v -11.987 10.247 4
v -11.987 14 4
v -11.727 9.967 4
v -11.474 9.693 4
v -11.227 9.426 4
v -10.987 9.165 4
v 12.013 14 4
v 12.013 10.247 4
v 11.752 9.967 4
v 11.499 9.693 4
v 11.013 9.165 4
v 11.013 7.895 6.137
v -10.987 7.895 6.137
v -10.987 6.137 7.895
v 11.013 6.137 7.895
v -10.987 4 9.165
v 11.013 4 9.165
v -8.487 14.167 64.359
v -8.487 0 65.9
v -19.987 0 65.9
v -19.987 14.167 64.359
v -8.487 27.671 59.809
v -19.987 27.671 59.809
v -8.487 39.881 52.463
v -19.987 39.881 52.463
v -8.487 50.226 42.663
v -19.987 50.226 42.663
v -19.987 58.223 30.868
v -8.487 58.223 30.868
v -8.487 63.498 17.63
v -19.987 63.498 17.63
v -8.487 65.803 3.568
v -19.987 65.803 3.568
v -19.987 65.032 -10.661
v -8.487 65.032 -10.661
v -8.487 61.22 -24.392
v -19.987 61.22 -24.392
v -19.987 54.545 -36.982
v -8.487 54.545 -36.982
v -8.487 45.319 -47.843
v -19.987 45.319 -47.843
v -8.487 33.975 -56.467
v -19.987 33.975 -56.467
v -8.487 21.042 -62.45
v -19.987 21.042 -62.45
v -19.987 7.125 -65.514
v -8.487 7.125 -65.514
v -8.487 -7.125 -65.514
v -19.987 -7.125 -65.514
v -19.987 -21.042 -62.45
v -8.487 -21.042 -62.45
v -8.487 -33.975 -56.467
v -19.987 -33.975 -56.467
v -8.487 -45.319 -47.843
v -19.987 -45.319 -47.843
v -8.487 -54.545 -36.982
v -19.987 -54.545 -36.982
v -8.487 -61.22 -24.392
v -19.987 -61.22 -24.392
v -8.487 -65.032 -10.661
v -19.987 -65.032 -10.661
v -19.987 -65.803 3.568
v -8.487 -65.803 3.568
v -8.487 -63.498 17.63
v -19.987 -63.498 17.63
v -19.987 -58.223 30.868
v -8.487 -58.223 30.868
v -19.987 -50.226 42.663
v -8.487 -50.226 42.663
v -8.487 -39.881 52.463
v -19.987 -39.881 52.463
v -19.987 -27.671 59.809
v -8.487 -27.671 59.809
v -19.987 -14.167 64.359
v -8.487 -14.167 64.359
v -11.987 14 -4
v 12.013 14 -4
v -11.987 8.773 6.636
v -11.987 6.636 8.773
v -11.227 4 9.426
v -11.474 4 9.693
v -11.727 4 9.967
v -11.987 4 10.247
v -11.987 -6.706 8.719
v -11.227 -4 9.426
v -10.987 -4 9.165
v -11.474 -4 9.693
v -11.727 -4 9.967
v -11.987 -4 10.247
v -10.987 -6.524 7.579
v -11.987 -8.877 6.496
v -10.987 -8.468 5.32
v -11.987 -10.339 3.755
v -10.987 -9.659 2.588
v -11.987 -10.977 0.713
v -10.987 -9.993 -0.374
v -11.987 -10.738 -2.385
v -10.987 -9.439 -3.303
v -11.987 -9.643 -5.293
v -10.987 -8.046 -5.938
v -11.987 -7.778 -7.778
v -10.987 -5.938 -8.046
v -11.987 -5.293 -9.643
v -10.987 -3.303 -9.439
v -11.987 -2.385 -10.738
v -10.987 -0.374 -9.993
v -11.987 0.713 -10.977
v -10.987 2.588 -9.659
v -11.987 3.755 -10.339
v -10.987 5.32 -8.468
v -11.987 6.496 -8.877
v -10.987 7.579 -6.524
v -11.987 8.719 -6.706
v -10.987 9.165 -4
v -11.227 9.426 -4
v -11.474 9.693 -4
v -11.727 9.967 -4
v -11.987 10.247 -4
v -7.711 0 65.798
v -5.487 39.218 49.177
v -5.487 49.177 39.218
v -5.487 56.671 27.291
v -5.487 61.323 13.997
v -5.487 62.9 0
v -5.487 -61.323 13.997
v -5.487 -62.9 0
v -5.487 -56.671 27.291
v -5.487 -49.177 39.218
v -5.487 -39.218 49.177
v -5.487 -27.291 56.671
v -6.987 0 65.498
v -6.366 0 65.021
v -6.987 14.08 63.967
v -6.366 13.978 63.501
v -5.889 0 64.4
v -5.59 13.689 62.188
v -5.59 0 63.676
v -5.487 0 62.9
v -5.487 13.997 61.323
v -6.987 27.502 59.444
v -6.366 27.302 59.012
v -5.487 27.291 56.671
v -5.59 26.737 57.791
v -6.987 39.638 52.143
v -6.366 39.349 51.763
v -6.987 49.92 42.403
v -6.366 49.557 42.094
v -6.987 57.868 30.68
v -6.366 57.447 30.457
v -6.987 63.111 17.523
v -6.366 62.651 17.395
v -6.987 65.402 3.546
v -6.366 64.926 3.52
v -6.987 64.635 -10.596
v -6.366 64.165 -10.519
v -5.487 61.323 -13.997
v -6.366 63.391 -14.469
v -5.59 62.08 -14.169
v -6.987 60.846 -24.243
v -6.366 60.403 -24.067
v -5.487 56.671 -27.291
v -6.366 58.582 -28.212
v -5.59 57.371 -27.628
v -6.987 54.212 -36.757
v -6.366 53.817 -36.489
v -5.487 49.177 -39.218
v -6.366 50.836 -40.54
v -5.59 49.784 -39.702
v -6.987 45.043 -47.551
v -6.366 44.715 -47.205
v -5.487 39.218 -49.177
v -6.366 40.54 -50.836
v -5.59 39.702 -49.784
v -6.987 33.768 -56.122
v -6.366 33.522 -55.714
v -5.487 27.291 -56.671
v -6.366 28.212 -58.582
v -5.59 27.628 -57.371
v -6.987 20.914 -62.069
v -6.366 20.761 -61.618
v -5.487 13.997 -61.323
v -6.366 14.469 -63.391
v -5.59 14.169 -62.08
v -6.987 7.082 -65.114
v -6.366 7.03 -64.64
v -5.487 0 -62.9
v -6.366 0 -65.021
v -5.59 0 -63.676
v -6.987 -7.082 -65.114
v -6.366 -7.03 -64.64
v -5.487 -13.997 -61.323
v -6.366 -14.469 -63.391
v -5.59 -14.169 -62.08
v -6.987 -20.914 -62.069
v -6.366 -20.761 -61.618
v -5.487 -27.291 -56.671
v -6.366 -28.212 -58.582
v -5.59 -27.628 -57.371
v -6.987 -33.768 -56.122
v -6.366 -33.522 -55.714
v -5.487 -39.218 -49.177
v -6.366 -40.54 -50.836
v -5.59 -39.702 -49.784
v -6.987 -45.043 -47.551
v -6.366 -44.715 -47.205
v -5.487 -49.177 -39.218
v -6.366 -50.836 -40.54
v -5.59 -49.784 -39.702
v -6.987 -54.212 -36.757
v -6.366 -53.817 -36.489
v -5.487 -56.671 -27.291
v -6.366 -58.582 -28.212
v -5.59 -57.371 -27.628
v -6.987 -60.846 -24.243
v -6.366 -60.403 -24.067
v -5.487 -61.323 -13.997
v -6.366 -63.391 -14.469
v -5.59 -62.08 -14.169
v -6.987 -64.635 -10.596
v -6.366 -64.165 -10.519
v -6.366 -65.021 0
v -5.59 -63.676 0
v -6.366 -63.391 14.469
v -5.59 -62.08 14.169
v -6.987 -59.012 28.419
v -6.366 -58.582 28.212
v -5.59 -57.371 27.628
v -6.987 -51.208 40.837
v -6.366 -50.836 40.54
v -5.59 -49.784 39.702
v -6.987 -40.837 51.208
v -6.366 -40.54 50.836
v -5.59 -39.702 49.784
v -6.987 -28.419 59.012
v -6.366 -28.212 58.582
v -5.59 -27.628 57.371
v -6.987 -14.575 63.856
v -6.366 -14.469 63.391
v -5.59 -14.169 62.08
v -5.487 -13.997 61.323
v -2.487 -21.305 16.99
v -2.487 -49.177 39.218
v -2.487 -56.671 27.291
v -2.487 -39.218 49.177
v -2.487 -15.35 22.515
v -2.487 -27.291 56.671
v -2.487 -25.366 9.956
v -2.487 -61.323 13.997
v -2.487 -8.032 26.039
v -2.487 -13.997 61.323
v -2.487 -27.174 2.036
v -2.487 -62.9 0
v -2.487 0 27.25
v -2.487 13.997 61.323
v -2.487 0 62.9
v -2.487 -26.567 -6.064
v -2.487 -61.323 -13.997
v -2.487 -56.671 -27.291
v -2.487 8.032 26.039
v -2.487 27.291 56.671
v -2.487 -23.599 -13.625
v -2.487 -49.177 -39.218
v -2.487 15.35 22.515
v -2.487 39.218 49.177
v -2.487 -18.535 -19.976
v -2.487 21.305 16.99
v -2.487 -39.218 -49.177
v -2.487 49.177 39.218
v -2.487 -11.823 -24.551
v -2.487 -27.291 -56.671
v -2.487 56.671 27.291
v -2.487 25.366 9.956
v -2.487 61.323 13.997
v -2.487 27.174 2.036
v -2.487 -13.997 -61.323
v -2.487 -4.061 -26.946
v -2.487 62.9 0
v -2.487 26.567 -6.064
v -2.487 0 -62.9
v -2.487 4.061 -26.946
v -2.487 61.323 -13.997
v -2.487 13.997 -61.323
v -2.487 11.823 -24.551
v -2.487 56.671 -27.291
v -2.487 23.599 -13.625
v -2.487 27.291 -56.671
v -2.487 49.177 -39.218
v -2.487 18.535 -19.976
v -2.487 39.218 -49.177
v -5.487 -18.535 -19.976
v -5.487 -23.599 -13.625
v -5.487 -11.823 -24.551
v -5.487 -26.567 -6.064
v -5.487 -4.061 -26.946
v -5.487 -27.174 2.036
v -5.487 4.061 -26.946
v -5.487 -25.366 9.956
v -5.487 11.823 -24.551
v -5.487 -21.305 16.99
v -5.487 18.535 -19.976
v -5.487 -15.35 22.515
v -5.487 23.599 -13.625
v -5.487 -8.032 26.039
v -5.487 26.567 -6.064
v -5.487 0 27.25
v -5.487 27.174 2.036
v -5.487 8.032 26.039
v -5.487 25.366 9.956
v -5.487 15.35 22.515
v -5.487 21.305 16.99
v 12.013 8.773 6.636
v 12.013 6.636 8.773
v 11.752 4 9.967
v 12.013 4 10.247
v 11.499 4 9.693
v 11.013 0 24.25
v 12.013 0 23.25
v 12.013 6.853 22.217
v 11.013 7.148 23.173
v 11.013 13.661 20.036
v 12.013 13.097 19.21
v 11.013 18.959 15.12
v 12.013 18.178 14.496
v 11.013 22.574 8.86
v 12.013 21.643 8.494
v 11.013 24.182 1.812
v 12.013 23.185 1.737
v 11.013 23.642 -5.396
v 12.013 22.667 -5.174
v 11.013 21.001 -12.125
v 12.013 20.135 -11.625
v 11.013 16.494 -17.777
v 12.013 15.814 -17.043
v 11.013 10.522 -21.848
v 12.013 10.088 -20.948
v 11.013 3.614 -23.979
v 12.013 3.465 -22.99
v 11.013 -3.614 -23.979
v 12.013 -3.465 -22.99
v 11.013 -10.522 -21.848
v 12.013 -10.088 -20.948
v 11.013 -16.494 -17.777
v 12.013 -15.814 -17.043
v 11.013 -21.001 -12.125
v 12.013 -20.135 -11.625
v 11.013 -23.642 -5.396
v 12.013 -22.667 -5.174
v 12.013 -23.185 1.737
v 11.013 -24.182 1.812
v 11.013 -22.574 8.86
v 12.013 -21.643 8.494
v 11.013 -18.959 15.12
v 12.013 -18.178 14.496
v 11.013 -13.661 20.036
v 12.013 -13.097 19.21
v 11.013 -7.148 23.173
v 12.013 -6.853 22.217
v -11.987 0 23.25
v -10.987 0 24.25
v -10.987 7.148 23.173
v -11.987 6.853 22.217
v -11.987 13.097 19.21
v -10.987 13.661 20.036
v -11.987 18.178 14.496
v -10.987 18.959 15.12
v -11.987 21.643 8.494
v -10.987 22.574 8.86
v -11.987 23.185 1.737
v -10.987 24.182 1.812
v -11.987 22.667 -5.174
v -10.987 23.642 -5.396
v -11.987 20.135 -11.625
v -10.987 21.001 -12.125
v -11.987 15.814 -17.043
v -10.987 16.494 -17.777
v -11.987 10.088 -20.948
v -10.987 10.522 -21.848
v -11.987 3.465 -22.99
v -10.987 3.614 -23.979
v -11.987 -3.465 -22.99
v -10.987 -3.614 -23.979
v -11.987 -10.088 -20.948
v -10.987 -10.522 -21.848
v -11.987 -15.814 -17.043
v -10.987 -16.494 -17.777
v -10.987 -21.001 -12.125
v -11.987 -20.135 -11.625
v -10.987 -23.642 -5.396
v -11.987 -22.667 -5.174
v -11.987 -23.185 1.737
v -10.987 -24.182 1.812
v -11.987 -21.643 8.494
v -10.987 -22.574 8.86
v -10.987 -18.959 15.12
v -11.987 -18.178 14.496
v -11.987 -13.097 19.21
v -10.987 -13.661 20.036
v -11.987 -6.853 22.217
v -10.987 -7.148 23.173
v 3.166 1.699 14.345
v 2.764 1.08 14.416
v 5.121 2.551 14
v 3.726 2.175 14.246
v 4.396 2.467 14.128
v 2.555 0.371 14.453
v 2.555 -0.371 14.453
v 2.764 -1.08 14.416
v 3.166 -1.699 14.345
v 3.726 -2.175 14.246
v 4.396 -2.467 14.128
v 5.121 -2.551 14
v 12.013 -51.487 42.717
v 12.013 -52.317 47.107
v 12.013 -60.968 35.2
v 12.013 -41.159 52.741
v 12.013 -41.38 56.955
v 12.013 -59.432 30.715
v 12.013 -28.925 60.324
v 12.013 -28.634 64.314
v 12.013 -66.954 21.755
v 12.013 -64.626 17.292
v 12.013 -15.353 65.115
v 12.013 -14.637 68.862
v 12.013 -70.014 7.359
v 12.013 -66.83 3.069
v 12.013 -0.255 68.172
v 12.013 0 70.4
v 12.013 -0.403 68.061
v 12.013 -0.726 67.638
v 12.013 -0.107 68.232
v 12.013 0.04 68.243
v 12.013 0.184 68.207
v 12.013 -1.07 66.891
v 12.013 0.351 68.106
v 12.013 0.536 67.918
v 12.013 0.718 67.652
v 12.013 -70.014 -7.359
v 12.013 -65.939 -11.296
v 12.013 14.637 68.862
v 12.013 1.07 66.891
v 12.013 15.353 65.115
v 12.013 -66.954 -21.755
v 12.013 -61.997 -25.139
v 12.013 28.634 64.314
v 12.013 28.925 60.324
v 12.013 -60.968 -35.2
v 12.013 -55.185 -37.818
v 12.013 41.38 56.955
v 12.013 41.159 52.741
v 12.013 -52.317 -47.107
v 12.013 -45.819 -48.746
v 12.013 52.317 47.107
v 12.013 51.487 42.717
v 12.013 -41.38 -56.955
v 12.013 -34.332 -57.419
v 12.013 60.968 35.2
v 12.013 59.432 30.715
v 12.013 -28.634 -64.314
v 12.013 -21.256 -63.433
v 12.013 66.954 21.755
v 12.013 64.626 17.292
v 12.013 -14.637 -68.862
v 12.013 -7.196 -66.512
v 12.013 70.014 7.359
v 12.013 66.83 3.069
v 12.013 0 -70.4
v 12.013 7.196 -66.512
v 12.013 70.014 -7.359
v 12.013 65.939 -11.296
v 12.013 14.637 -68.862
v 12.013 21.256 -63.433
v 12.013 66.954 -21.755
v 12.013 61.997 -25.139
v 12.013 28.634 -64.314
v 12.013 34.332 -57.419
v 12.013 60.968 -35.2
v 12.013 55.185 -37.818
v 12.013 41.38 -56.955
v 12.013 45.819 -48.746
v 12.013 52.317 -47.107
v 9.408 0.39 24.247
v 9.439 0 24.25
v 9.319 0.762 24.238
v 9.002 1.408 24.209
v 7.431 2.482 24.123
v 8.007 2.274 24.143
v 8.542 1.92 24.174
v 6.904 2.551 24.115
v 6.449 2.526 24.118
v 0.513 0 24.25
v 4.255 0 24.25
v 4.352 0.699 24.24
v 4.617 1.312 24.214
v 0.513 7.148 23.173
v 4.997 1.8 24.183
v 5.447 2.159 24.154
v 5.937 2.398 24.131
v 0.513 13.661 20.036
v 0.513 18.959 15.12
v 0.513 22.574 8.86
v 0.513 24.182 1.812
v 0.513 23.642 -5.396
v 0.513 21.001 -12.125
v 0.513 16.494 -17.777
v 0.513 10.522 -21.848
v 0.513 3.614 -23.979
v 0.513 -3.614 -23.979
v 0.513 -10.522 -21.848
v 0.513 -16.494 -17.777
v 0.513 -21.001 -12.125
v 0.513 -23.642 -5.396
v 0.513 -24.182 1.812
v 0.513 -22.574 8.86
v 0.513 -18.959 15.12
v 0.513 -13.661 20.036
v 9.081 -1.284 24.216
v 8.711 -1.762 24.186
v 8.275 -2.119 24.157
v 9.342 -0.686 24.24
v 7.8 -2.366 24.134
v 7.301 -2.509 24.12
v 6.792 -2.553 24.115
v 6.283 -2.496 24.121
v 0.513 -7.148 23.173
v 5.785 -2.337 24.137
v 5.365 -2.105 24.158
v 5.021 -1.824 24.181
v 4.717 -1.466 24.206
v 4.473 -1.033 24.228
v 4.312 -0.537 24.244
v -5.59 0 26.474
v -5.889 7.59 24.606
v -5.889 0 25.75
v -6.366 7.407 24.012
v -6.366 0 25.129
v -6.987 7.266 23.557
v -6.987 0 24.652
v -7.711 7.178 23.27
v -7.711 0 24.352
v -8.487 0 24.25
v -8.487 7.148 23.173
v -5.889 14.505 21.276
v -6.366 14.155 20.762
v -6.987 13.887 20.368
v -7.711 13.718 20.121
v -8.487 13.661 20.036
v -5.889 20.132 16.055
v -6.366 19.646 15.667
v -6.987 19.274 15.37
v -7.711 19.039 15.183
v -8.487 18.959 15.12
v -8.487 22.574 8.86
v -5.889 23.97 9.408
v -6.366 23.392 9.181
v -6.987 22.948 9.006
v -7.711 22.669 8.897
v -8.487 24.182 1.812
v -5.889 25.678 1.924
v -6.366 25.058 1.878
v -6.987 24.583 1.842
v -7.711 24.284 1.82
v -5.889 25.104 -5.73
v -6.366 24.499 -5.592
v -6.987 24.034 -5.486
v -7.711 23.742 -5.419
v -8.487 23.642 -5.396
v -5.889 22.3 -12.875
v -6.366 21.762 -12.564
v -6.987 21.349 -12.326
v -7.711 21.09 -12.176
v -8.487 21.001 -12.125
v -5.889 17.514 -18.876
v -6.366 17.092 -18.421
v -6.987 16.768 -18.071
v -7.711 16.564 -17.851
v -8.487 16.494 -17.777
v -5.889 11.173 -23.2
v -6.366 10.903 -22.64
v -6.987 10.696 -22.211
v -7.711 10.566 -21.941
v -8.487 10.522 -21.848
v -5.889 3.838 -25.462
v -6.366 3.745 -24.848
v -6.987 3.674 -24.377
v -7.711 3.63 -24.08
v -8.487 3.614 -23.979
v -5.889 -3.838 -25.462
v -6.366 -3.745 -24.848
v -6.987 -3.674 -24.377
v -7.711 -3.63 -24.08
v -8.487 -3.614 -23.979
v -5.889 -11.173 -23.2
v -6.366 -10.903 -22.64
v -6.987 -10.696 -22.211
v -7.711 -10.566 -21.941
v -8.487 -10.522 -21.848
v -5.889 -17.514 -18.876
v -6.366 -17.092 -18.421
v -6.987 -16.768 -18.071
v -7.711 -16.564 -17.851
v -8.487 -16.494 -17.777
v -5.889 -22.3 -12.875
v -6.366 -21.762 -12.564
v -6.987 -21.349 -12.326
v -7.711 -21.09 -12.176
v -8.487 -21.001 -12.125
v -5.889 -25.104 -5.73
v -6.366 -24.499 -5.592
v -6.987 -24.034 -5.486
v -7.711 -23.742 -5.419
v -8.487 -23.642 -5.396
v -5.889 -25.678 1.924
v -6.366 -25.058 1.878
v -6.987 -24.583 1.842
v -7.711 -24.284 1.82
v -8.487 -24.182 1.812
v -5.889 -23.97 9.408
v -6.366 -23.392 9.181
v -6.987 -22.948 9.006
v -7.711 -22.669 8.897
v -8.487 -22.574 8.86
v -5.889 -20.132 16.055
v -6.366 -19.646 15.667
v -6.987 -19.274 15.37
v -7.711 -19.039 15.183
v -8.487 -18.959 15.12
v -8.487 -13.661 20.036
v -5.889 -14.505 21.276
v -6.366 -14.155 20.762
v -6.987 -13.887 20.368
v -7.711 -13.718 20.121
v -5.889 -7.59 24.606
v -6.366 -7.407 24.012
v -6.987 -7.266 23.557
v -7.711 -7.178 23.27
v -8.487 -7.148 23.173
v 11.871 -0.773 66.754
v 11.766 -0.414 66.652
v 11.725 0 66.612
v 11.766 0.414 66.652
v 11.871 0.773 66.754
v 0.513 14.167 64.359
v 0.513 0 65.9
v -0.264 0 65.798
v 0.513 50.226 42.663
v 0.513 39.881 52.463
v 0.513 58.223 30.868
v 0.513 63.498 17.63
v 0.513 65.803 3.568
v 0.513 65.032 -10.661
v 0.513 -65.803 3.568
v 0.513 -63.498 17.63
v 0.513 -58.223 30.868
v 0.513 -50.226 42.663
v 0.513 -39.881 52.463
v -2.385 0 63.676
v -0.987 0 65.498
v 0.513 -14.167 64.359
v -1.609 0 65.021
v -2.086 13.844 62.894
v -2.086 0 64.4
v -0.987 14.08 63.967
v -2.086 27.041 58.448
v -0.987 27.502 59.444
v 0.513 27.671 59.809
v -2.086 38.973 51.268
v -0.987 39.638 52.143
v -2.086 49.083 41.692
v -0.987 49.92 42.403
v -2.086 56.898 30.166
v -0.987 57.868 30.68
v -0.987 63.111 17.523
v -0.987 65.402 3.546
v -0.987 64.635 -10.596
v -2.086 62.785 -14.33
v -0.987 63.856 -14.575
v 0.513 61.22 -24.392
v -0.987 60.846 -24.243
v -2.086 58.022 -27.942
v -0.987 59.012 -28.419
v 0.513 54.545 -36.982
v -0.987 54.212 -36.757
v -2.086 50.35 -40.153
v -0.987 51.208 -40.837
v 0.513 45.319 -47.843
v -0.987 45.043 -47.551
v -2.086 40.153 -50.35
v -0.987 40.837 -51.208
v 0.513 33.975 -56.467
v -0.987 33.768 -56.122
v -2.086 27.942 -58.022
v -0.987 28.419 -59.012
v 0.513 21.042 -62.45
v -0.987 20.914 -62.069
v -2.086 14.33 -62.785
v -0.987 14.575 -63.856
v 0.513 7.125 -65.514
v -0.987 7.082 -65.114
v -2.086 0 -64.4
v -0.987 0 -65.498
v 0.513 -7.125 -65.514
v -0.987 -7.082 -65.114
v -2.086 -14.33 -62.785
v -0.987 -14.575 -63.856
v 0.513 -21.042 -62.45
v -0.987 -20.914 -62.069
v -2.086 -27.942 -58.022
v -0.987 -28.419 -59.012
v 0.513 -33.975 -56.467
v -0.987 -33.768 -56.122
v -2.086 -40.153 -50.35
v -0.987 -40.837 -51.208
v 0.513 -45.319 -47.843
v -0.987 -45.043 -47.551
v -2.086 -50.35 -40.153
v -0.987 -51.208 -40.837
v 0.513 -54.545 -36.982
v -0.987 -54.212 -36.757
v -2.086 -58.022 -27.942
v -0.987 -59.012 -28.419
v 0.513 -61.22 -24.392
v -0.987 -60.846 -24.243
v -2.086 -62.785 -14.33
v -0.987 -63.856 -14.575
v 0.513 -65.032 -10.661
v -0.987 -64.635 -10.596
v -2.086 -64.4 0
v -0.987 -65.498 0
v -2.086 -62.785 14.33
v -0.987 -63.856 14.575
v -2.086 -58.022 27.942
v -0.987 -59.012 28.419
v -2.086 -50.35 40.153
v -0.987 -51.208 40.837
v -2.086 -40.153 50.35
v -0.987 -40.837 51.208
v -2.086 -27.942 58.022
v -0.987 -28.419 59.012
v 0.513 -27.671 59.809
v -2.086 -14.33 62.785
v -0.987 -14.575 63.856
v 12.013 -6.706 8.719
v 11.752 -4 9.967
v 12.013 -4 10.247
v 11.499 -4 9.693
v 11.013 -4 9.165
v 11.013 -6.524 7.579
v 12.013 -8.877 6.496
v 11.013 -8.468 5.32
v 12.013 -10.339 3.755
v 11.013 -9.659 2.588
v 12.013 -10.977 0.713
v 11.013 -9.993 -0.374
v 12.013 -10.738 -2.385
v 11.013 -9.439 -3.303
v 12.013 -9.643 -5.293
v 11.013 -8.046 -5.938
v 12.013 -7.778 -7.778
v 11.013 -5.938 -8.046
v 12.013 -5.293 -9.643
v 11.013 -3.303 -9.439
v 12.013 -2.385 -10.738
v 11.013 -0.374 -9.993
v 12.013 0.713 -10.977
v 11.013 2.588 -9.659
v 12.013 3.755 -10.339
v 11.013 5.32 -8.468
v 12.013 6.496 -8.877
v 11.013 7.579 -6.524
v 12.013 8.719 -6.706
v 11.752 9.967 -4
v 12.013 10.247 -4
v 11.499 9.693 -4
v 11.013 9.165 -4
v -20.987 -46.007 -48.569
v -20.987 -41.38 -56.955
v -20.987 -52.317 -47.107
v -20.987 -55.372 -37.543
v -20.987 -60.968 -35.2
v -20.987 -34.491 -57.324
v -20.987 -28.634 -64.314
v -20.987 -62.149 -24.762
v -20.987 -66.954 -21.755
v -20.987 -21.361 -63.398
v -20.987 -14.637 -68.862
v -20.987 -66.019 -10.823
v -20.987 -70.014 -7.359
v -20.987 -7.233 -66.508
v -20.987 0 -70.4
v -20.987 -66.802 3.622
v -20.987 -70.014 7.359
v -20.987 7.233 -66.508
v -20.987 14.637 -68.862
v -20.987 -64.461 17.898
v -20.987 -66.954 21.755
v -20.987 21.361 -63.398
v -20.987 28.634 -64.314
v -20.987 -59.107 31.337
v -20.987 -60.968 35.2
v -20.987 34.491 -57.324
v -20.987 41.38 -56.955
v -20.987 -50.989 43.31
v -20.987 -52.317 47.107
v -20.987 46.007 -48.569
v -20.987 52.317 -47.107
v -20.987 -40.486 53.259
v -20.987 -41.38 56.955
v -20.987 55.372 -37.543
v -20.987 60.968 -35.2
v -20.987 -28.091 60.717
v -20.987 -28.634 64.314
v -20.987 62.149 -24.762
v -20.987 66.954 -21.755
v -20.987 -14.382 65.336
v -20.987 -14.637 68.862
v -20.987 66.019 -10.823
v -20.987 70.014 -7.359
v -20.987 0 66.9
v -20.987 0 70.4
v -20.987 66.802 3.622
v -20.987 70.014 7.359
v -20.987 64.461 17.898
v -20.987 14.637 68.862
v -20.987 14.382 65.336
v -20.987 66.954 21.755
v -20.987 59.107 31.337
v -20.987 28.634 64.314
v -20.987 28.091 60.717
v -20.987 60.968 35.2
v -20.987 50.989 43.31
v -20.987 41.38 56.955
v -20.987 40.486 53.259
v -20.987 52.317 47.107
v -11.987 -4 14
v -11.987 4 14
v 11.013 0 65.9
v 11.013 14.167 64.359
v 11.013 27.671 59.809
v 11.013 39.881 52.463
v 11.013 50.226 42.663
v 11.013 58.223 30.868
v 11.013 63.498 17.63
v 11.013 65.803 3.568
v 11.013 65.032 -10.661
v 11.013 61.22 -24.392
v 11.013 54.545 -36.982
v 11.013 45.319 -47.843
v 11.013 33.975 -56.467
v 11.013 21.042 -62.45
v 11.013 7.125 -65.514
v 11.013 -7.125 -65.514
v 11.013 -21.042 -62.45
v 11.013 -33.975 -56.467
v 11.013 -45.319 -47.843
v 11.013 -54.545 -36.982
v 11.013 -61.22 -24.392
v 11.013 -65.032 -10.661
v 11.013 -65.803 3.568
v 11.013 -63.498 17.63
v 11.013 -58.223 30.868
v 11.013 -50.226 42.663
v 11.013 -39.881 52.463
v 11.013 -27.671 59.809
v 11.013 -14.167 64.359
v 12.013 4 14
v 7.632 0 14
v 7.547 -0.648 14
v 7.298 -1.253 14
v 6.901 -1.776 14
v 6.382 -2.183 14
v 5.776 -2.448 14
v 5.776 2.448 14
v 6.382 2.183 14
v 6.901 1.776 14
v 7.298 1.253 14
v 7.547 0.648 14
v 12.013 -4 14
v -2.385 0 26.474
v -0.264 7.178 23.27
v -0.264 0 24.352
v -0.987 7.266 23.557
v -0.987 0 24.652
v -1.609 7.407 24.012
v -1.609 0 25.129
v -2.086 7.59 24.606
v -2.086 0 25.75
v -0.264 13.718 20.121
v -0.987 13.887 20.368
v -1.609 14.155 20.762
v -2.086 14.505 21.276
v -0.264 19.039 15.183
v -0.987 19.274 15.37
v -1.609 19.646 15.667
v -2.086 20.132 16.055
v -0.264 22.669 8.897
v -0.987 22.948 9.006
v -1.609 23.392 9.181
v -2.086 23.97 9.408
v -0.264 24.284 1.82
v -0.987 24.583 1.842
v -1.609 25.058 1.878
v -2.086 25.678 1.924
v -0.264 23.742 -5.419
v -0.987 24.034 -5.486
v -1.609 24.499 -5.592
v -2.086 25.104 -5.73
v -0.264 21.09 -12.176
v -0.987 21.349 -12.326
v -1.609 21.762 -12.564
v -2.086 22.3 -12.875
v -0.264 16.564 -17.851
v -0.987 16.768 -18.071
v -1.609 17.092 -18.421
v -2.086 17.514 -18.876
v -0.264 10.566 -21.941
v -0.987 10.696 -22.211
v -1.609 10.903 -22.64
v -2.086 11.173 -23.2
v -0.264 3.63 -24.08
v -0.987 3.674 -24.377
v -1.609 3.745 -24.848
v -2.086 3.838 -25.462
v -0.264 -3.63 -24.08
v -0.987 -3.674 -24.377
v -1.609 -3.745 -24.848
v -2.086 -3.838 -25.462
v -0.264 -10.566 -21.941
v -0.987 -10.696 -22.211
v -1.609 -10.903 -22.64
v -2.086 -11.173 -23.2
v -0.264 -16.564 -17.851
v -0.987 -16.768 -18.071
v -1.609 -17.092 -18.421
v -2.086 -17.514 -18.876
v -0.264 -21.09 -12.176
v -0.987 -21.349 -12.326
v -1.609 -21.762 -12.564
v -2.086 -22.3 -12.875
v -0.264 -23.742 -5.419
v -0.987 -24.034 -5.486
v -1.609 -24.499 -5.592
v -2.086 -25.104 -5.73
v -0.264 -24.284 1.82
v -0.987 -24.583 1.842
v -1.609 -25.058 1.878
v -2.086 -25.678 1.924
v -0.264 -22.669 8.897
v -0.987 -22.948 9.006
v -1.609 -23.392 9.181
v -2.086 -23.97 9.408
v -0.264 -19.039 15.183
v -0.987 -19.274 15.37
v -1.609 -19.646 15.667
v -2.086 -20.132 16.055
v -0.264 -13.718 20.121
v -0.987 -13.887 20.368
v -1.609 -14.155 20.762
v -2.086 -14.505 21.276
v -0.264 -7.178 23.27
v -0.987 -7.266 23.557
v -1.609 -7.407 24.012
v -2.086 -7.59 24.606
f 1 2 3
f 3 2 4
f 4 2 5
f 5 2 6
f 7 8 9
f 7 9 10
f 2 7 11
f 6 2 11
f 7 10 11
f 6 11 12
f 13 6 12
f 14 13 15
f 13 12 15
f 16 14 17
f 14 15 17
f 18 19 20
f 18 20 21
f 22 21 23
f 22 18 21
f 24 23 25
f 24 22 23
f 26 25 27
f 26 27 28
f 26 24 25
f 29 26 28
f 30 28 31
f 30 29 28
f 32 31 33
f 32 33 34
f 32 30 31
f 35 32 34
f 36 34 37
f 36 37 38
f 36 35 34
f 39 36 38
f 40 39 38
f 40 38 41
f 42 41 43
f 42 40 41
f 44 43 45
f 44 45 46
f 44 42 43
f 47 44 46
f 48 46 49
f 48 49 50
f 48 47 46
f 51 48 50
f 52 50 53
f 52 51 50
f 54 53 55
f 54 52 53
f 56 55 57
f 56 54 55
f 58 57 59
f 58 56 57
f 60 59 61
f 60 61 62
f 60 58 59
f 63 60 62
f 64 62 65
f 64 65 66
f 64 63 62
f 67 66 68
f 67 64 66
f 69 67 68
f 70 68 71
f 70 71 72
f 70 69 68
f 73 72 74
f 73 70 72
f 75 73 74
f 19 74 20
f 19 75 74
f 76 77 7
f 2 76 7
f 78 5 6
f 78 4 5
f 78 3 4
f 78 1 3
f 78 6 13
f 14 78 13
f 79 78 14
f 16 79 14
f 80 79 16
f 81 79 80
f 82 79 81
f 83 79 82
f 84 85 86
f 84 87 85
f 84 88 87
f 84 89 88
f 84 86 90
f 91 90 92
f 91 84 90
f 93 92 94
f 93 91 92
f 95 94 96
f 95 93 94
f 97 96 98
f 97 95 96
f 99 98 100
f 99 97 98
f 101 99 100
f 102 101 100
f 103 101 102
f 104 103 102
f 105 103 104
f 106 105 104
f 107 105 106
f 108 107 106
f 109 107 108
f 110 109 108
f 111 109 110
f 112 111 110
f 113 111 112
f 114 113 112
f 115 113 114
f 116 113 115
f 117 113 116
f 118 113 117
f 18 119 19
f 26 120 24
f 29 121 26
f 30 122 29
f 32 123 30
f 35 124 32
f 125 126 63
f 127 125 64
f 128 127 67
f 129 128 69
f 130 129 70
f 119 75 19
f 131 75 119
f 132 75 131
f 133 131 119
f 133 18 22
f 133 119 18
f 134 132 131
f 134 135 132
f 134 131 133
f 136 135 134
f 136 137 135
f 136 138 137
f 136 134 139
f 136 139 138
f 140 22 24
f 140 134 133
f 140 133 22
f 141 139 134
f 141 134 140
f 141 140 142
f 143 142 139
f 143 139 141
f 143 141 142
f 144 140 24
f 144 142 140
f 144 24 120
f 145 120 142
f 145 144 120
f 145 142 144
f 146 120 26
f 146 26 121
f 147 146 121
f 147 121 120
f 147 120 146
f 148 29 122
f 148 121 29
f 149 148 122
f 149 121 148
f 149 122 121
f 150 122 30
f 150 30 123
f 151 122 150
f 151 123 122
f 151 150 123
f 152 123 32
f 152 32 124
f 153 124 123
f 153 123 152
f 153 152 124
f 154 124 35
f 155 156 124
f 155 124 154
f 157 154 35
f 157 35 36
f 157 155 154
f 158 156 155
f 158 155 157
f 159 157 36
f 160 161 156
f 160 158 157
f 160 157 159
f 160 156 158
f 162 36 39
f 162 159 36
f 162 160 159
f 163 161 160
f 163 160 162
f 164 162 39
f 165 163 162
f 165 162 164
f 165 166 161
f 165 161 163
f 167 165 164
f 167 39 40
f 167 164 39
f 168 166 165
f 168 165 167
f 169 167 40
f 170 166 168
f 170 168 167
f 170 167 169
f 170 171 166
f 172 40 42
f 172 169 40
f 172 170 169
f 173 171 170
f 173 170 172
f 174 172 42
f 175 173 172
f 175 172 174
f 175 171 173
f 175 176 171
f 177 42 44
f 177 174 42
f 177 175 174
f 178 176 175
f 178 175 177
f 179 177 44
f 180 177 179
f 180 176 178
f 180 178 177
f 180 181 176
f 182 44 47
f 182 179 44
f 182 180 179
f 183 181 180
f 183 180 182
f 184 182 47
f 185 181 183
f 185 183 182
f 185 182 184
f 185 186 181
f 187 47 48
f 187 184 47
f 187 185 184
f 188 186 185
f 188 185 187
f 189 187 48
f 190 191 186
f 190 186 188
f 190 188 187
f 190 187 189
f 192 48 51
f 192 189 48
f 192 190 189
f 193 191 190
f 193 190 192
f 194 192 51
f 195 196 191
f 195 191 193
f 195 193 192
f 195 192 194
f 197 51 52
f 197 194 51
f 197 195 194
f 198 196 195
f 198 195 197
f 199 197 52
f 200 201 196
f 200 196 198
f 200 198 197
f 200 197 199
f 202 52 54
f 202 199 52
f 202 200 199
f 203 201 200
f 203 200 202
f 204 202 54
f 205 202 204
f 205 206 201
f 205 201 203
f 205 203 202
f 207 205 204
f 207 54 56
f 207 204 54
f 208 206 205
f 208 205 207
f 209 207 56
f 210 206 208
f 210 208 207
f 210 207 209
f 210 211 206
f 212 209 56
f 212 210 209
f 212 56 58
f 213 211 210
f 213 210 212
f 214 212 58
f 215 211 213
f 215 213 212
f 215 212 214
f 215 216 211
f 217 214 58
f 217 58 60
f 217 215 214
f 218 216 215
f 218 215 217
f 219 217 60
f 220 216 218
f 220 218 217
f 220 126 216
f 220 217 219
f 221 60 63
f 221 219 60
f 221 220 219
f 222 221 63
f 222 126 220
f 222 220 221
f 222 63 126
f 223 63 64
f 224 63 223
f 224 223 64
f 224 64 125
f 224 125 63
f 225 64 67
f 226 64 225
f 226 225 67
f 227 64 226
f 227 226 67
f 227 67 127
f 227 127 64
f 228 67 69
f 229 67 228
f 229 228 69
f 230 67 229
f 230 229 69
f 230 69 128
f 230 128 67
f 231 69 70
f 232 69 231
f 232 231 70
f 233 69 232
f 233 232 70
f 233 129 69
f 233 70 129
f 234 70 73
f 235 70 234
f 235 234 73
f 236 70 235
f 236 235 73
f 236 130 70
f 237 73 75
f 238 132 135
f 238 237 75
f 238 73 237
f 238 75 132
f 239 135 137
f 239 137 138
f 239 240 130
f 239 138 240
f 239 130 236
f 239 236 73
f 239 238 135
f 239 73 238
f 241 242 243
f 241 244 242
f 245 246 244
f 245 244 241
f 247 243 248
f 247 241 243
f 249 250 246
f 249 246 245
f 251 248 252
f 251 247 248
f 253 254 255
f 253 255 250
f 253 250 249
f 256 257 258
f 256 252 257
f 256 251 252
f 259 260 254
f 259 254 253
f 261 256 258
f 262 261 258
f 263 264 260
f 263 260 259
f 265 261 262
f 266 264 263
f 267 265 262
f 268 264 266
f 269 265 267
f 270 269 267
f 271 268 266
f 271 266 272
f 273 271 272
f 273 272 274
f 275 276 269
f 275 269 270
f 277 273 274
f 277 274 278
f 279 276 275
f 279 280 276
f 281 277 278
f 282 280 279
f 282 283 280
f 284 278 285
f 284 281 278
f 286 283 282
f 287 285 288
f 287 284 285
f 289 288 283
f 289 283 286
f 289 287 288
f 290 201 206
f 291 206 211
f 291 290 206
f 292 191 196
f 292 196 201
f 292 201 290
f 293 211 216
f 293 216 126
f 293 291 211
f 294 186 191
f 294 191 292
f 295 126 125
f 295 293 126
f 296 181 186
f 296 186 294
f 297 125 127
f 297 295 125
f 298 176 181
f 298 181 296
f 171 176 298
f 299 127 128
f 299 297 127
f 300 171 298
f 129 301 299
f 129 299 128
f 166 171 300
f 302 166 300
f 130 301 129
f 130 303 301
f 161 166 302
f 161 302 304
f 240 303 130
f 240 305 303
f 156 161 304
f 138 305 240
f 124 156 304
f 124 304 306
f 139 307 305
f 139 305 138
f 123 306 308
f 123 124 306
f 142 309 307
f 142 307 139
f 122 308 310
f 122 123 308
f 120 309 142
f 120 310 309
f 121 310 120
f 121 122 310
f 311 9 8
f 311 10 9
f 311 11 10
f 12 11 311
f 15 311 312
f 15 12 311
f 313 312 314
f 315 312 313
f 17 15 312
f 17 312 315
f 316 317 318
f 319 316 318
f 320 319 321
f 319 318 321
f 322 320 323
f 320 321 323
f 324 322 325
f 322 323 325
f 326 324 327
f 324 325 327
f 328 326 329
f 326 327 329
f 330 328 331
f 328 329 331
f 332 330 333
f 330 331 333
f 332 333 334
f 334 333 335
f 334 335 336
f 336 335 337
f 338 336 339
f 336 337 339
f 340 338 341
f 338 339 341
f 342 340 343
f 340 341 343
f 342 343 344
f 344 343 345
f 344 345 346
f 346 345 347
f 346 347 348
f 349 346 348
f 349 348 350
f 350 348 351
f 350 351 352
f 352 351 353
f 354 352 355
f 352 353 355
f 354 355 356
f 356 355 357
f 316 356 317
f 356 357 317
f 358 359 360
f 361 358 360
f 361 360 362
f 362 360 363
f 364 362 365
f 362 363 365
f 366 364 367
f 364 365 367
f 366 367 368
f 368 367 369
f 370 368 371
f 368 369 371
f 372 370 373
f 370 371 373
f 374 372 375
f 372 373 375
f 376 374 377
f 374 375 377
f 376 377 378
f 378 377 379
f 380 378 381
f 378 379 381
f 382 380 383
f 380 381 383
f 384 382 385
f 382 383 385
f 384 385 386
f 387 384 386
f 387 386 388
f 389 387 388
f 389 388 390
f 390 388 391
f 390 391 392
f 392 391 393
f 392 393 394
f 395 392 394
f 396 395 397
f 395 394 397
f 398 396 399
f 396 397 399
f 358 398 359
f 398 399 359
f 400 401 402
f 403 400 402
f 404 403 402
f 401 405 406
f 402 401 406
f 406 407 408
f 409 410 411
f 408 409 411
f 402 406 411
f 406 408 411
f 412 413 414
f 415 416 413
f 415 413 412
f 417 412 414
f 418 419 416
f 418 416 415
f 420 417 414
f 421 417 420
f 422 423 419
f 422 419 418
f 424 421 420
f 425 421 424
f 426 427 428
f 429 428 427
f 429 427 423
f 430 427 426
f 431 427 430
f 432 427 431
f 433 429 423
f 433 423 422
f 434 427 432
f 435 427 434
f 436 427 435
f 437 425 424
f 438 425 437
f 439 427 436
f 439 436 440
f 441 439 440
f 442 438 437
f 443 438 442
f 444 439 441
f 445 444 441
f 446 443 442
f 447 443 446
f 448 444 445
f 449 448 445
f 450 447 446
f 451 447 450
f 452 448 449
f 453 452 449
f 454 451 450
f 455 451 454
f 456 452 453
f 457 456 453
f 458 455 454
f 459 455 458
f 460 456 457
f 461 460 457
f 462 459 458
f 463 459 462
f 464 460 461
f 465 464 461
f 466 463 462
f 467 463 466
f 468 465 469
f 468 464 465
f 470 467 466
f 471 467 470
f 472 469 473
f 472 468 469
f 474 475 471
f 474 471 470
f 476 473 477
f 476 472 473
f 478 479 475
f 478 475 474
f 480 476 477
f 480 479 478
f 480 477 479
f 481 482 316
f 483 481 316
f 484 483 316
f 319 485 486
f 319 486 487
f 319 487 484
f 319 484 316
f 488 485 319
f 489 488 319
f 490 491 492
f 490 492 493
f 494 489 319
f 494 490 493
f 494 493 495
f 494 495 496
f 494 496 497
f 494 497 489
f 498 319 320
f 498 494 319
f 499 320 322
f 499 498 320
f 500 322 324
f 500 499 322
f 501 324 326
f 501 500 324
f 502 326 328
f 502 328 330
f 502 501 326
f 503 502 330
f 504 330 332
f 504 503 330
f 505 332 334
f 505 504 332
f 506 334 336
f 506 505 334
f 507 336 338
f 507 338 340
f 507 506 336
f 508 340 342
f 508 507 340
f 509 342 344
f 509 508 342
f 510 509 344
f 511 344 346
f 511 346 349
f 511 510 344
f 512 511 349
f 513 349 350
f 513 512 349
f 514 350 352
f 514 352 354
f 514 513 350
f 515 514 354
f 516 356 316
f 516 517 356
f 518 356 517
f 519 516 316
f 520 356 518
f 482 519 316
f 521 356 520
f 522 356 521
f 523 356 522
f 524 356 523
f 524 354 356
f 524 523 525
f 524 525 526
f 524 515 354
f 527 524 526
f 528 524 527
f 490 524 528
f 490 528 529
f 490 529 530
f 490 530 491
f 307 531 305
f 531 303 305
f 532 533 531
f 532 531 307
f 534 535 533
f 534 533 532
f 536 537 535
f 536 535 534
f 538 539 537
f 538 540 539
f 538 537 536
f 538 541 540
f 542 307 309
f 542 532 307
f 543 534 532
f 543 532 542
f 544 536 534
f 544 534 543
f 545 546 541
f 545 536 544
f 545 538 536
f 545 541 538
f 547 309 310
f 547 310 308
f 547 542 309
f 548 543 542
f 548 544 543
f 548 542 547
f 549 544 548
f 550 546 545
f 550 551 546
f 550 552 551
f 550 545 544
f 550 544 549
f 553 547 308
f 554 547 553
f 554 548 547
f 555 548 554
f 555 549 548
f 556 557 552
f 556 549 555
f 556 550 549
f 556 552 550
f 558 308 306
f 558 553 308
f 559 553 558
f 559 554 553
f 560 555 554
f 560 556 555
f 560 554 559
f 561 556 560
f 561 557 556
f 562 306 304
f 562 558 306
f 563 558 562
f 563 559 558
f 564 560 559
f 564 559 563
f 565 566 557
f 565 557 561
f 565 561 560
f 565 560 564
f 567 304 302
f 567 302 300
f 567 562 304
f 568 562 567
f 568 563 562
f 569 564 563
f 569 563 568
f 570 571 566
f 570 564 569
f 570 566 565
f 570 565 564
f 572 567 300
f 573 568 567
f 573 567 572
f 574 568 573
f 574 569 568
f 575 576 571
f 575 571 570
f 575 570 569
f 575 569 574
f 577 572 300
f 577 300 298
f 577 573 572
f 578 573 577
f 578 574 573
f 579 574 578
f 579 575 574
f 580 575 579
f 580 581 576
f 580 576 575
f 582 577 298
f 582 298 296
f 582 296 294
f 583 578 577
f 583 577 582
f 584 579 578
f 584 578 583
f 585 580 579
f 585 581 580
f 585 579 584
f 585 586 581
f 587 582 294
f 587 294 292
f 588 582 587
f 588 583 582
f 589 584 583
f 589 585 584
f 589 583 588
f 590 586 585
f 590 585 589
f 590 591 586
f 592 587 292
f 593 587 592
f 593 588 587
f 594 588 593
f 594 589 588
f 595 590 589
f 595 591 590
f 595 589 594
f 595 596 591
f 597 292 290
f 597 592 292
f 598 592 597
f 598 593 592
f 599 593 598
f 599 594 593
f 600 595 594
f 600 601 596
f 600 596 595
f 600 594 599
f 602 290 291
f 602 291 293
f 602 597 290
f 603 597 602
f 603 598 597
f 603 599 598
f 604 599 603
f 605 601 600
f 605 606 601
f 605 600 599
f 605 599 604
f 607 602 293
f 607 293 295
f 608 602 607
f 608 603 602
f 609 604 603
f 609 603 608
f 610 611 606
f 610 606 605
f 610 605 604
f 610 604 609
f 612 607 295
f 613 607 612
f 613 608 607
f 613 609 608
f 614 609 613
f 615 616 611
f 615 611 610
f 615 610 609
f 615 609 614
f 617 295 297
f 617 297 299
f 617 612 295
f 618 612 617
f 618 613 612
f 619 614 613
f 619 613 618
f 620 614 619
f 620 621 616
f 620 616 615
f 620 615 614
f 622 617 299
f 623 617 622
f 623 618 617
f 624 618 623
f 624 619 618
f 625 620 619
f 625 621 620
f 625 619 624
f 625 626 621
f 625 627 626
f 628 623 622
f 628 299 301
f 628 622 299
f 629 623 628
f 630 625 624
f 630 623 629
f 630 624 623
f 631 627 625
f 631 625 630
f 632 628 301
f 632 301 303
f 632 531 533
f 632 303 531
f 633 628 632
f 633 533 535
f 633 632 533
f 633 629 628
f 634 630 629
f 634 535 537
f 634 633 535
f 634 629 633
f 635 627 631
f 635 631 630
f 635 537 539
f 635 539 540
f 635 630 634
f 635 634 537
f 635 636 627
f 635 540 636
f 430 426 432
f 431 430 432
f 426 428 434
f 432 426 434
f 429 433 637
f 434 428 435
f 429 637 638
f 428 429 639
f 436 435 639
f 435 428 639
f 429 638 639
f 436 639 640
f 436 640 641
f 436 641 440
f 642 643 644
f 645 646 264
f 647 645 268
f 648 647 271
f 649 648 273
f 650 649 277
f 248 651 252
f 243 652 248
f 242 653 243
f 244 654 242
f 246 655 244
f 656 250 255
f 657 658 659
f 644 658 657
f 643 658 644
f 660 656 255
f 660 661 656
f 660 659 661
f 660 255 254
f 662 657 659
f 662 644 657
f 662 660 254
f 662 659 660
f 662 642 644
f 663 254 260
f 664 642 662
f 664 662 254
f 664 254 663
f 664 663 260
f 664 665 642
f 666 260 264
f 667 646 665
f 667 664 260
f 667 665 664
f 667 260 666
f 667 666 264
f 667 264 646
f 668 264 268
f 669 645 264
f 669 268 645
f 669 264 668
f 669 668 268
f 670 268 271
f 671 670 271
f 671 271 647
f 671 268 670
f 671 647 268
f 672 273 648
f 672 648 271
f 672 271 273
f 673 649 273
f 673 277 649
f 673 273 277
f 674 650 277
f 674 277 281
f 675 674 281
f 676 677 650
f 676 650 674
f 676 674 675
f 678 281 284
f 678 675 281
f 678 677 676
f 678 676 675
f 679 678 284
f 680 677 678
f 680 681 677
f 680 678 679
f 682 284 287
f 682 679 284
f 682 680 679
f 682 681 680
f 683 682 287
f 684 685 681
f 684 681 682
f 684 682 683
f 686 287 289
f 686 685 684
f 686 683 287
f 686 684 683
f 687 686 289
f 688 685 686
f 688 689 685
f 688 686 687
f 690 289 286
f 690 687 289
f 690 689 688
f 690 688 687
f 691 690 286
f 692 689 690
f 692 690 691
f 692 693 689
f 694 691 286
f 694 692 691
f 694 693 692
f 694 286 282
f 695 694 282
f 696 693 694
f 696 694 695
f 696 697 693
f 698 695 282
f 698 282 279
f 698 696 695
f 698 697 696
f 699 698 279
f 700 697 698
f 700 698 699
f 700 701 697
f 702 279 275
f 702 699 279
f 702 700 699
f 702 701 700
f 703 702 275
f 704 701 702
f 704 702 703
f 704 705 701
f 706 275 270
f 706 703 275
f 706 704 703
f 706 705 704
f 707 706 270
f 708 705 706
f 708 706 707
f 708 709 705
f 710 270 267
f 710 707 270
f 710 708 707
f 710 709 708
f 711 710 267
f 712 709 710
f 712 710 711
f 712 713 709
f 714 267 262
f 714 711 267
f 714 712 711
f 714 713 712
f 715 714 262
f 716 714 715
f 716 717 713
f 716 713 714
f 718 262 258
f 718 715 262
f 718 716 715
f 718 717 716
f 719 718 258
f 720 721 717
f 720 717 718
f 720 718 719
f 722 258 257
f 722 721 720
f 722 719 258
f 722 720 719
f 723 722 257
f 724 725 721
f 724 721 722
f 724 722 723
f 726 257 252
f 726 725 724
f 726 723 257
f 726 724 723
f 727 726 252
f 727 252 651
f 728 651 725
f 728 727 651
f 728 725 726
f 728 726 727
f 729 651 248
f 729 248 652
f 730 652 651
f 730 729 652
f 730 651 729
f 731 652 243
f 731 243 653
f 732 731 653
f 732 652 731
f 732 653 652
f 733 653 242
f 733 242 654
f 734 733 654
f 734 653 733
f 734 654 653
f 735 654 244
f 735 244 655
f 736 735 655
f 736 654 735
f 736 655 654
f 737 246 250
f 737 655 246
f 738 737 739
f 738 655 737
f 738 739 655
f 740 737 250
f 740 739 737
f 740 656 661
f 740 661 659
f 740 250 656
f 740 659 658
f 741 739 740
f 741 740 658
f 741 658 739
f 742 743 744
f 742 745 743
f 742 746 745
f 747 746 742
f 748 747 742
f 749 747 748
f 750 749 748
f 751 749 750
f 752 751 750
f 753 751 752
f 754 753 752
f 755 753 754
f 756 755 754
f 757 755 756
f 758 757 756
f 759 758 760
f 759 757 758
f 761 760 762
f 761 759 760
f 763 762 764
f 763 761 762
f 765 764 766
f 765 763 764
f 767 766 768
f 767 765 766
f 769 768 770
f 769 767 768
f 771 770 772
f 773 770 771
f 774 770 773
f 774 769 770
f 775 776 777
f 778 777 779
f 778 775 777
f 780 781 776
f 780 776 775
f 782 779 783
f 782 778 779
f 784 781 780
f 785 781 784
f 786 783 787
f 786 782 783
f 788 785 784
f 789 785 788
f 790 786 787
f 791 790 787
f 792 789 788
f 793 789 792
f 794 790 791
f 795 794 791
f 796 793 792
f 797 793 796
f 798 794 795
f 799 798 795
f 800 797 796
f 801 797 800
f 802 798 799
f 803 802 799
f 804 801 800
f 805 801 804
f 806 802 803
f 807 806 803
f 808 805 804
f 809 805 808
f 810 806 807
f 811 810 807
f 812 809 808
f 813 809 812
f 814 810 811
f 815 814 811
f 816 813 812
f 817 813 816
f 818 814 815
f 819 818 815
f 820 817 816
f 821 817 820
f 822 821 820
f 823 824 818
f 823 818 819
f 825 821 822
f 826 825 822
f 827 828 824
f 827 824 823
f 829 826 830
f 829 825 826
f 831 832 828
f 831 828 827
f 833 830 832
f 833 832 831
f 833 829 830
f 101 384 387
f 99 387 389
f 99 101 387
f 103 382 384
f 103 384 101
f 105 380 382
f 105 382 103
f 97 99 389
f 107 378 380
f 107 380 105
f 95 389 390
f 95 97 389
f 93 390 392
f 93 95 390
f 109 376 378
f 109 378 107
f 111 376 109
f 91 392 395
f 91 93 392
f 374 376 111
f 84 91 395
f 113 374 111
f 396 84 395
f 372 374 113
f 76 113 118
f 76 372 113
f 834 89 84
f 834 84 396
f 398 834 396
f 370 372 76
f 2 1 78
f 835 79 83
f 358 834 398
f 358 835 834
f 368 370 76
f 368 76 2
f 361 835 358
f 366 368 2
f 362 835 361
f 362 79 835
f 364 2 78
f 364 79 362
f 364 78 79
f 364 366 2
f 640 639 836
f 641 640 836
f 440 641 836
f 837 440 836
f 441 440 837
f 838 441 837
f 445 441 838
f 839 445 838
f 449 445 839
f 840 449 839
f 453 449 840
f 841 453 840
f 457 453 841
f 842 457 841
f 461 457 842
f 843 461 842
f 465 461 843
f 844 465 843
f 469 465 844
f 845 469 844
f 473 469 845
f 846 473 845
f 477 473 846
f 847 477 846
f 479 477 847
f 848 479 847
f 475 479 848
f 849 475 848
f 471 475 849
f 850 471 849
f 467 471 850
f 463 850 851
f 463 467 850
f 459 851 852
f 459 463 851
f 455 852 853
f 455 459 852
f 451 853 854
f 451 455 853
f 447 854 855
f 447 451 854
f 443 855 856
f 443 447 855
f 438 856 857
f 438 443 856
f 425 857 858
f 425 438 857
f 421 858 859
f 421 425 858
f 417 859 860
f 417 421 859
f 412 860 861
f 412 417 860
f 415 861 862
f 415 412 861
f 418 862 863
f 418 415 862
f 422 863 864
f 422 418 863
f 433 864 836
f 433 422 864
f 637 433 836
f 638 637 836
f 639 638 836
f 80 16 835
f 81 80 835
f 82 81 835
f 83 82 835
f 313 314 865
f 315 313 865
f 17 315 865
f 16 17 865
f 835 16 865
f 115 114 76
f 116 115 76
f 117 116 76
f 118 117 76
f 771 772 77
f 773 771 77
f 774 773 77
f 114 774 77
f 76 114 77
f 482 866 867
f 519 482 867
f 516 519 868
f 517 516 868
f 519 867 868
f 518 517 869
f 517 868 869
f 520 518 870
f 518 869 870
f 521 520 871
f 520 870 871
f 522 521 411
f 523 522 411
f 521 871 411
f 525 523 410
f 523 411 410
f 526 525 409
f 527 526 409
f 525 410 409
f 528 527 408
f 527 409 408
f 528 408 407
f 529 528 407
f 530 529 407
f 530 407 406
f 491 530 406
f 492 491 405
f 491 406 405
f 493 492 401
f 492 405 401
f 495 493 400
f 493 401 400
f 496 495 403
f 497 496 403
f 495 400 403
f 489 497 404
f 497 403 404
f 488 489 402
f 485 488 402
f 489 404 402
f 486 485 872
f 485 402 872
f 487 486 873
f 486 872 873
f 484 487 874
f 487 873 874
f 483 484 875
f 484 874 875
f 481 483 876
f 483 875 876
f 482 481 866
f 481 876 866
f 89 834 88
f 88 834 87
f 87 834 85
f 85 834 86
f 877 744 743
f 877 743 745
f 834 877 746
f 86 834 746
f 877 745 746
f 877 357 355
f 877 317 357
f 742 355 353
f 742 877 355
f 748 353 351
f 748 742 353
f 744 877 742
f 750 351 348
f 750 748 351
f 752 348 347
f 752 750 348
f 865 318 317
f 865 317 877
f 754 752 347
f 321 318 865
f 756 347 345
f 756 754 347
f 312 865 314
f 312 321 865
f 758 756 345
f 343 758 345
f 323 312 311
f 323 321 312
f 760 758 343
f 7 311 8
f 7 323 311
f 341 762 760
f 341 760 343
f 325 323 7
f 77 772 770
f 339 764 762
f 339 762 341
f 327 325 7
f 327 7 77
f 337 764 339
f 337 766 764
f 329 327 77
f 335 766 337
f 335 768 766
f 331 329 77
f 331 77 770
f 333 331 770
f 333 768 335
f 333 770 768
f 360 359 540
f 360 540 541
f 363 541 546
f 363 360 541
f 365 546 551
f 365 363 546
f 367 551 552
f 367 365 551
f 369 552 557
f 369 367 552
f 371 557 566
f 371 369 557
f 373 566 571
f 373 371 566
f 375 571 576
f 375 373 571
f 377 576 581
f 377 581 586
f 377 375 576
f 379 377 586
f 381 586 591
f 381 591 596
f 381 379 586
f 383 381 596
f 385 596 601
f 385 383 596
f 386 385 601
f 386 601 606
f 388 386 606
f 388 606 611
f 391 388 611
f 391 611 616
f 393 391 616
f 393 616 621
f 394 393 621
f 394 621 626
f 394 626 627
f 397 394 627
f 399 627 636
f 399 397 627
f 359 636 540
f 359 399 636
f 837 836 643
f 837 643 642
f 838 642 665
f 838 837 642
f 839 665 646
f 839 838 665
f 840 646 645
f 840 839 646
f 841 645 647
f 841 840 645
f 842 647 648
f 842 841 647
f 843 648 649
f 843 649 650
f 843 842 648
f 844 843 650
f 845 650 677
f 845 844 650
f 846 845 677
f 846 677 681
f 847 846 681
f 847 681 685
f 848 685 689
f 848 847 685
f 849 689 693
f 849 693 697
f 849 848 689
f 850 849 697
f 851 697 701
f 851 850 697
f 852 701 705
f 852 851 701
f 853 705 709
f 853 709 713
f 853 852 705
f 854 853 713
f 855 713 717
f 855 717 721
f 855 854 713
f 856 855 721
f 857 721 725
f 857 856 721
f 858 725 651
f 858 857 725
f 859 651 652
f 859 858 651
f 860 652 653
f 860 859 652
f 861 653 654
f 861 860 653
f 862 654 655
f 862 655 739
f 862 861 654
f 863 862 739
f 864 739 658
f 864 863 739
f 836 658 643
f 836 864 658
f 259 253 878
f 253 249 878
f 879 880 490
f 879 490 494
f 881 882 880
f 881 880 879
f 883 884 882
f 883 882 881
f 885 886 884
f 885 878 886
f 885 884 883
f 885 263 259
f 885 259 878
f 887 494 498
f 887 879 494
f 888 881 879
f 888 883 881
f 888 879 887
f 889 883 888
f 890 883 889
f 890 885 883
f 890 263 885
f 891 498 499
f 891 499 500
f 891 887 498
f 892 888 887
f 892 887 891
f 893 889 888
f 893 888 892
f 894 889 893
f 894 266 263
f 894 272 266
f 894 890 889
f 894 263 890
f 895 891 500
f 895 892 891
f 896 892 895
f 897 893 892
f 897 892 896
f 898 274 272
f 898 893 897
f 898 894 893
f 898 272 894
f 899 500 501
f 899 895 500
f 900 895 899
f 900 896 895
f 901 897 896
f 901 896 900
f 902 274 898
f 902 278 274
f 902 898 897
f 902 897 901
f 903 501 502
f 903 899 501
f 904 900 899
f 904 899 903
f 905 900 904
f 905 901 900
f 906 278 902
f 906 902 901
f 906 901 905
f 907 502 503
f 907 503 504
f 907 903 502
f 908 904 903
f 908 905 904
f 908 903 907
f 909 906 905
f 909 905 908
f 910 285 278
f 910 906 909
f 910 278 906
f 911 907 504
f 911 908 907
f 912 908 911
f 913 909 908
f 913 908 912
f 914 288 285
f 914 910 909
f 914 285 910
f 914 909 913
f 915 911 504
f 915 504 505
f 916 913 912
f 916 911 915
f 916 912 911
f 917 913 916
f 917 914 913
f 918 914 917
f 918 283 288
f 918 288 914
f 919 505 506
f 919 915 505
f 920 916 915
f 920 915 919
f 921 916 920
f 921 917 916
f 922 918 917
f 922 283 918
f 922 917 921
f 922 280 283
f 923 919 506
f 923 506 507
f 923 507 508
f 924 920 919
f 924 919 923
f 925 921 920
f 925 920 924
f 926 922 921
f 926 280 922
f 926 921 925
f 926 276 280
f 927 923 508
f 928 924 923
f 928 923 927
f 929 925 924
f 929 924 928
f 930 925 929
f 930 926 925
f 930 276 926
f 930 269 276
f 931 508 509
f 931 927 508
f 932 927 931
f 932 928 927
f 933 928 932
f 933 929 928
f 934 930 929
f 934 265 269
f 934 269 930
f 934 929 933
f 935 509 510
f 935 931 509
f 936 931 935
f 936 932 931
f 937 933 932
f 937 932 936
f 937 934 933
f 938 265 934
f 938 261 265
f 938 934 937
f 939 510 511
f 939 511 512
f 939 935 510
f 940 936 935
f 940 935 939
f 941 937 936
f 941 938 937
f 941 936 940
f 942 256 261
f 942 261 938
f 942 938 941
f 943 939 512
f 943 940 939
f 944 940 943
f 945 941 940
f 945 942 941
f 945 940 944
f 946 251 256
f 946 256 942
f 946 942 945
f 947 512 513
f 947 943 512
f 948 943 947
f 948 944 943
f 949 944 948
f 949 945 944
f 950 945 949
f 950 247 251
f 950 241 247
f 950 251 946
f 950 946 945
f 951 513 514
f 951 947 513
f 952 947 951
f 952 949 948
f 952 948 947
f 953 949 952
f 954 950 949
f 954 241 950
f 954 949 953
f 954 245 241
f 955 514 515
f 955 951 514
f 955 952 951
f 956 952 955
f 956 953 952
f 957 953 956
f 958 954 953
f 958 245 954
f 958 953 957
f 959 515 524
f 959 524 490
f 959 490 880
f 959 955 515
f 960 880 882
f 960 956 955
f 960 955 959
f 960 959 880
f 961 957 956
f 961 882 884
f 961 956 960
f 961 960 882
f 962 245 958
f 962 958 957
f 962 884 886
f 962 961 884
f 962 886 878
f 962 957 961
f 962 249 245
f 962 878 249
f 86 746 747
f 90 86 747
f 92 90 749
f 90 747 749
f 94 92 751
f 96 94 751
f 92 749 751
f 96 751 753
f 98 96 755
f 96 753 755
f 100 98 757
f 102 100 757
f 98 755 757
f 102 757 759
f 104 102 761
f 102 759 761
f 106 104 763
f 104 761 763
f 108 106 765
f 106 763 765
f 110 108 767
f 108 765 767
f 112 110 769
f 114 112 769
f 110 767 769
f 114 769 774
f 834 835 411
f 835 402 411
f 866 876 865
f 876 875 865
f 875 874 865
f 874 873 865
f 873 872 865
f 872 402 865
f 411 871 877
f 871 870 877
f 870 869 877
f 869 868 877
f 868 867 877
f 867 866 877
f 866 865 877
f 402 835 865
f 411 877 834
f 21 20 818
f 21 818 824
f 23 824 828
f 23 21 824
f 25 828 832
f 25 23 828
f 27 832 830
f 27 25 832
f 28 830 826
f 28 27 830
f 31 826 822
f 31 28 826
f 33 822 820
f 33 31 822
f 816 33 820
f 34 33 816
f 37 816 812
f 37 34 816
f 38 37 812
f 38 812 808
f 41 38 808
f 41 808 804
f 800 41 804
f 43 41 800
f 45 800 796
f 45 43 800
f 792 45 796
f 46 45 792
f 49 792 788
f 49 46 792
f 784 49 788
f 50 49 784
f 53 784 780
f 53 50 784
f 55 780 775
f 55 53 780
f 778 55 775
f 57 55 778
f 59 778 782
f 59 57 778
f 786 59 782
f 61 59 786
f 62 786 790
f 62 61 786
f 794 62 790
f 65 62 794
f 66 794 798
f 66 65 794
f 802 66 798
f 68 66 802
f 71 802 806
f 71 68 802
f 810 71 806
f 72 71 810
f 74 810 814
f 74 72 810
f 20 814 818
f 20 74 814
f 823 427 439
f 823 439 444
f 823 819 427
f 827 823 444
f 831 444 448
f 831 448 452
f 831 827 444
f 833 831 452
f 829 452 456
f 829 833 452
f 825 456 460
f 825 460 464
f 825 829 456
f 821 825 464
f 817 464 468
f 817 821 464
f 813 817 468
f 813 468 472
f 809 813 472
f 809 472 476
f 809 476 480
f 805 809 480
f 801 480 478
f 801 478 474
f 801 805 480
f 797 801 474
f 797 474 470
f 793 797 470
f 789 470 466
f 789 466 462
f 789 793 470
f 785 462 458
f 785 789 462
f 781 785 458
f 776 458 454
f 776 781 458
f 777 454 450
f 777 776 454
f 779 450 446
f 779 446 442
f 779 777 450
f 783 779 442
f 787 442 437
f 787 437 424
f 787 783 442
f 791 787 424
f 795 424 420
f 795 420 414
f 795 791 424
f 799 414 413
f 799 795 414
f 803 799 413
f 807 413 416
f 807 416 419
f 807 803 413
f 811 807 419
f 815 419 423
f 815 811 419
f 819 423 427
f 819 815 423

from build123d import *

# Parameters (mm, degrees)
F2_R     = 3
F4_DEPTH = 25
F5_SIZE  = 1
F9_D     = 5.1054
F9_DEPTH = 56.7408363237


with BuildPart() as f1:
    # F0 (on Front) → F1 (revolve)
    with BuildSketch(Plane.XZ):
        Polygon((-11.987469025, 24.25), (-11.987469025, 0), (12.012530975, 0), (12.012530975, 24.25), (-2.487469025, 24.25), (-2.487469025, 65.9), (12.012530975, 65.9), (12.012530975, 70.4), (-20.987469025, 70.4), (-20.987469025, 65.9), (-5.487469025, 65.9), (-5.487469025, 24.25), align=None)
    revolve(axis=Axis((-25.877635926, 0, 0), (-1, 0, 0)))

    # F2
    f2_edges = [f1.edges().sort_by_distance(p)[0] for p in [
        (-2.487469, 0, -24.25),
        (-2.487469, 0, -65.9),
        (-5.487469, 0, -24.25),
        (-5.487469, 0, -65.9),
    ]]
    fillet(f2_edges, radius=F2_R)

    # F3 (on face) → F4 (cut)
    with BuildSketch(Plane.YZ.offset(12.012530975)):
        with BuildLine():
            Line((-4, 14), (-4, 9.1651513899))
            ThreePointArc((-4, 9.1651513899), (-7.0710678119, -7.0710678119), (9.1651513899, -4))
            Line((9.1651513899, -4), (14, -4))
            Line((14, -4), (14, 4))
            Line((14, 4), (9.1651513899, 4))
            ThreePointArc((9.1651513899, 4), (7.0710678119, 7.0710678119), (4, 9.1651513899))
            Line((4, 9.1651513899), (4, 14))
            Line((4, 14), (-4, 14))
        make_face()
    extrude(amount=-F4_DEPTH, mode=Mode.SUBTRACT)

    # F5
    f5_edges = [f1.edges().sort_by_distance(p)[0] for p in [
        (12.012531, 0, -65.9),
        (12.012531, 0, -24.25),
        (12.012531, -7.071068, -7.071068),
        (12.012531, 7.071068, 7.071068),
        (-11.987469, 0, -24.25),
        (-20.987469, 0, -65.9),
        (-11.987469, -7.071068, -7.071068),
        (-11.987469, 7.071068, 7.071068),
    ]]
    chamfer(f5_edges, length=F5_SIZE)

    # F9 (through all, one way)
    with BuildSketch(Plane(origin=(2.5485619967, 0, 14.4536133183), x_dir=(0.984807753, 0, -0.1736481777), z_dir=(-0.1736481777, 0, -0.984807753))):
        with Locations((2.532057697, 0)):
            Circle(F9_D / 2)
    extrude(amount=-F9_DEPTH, mode=Mode.SUBTRACT)


solid = f1.part
